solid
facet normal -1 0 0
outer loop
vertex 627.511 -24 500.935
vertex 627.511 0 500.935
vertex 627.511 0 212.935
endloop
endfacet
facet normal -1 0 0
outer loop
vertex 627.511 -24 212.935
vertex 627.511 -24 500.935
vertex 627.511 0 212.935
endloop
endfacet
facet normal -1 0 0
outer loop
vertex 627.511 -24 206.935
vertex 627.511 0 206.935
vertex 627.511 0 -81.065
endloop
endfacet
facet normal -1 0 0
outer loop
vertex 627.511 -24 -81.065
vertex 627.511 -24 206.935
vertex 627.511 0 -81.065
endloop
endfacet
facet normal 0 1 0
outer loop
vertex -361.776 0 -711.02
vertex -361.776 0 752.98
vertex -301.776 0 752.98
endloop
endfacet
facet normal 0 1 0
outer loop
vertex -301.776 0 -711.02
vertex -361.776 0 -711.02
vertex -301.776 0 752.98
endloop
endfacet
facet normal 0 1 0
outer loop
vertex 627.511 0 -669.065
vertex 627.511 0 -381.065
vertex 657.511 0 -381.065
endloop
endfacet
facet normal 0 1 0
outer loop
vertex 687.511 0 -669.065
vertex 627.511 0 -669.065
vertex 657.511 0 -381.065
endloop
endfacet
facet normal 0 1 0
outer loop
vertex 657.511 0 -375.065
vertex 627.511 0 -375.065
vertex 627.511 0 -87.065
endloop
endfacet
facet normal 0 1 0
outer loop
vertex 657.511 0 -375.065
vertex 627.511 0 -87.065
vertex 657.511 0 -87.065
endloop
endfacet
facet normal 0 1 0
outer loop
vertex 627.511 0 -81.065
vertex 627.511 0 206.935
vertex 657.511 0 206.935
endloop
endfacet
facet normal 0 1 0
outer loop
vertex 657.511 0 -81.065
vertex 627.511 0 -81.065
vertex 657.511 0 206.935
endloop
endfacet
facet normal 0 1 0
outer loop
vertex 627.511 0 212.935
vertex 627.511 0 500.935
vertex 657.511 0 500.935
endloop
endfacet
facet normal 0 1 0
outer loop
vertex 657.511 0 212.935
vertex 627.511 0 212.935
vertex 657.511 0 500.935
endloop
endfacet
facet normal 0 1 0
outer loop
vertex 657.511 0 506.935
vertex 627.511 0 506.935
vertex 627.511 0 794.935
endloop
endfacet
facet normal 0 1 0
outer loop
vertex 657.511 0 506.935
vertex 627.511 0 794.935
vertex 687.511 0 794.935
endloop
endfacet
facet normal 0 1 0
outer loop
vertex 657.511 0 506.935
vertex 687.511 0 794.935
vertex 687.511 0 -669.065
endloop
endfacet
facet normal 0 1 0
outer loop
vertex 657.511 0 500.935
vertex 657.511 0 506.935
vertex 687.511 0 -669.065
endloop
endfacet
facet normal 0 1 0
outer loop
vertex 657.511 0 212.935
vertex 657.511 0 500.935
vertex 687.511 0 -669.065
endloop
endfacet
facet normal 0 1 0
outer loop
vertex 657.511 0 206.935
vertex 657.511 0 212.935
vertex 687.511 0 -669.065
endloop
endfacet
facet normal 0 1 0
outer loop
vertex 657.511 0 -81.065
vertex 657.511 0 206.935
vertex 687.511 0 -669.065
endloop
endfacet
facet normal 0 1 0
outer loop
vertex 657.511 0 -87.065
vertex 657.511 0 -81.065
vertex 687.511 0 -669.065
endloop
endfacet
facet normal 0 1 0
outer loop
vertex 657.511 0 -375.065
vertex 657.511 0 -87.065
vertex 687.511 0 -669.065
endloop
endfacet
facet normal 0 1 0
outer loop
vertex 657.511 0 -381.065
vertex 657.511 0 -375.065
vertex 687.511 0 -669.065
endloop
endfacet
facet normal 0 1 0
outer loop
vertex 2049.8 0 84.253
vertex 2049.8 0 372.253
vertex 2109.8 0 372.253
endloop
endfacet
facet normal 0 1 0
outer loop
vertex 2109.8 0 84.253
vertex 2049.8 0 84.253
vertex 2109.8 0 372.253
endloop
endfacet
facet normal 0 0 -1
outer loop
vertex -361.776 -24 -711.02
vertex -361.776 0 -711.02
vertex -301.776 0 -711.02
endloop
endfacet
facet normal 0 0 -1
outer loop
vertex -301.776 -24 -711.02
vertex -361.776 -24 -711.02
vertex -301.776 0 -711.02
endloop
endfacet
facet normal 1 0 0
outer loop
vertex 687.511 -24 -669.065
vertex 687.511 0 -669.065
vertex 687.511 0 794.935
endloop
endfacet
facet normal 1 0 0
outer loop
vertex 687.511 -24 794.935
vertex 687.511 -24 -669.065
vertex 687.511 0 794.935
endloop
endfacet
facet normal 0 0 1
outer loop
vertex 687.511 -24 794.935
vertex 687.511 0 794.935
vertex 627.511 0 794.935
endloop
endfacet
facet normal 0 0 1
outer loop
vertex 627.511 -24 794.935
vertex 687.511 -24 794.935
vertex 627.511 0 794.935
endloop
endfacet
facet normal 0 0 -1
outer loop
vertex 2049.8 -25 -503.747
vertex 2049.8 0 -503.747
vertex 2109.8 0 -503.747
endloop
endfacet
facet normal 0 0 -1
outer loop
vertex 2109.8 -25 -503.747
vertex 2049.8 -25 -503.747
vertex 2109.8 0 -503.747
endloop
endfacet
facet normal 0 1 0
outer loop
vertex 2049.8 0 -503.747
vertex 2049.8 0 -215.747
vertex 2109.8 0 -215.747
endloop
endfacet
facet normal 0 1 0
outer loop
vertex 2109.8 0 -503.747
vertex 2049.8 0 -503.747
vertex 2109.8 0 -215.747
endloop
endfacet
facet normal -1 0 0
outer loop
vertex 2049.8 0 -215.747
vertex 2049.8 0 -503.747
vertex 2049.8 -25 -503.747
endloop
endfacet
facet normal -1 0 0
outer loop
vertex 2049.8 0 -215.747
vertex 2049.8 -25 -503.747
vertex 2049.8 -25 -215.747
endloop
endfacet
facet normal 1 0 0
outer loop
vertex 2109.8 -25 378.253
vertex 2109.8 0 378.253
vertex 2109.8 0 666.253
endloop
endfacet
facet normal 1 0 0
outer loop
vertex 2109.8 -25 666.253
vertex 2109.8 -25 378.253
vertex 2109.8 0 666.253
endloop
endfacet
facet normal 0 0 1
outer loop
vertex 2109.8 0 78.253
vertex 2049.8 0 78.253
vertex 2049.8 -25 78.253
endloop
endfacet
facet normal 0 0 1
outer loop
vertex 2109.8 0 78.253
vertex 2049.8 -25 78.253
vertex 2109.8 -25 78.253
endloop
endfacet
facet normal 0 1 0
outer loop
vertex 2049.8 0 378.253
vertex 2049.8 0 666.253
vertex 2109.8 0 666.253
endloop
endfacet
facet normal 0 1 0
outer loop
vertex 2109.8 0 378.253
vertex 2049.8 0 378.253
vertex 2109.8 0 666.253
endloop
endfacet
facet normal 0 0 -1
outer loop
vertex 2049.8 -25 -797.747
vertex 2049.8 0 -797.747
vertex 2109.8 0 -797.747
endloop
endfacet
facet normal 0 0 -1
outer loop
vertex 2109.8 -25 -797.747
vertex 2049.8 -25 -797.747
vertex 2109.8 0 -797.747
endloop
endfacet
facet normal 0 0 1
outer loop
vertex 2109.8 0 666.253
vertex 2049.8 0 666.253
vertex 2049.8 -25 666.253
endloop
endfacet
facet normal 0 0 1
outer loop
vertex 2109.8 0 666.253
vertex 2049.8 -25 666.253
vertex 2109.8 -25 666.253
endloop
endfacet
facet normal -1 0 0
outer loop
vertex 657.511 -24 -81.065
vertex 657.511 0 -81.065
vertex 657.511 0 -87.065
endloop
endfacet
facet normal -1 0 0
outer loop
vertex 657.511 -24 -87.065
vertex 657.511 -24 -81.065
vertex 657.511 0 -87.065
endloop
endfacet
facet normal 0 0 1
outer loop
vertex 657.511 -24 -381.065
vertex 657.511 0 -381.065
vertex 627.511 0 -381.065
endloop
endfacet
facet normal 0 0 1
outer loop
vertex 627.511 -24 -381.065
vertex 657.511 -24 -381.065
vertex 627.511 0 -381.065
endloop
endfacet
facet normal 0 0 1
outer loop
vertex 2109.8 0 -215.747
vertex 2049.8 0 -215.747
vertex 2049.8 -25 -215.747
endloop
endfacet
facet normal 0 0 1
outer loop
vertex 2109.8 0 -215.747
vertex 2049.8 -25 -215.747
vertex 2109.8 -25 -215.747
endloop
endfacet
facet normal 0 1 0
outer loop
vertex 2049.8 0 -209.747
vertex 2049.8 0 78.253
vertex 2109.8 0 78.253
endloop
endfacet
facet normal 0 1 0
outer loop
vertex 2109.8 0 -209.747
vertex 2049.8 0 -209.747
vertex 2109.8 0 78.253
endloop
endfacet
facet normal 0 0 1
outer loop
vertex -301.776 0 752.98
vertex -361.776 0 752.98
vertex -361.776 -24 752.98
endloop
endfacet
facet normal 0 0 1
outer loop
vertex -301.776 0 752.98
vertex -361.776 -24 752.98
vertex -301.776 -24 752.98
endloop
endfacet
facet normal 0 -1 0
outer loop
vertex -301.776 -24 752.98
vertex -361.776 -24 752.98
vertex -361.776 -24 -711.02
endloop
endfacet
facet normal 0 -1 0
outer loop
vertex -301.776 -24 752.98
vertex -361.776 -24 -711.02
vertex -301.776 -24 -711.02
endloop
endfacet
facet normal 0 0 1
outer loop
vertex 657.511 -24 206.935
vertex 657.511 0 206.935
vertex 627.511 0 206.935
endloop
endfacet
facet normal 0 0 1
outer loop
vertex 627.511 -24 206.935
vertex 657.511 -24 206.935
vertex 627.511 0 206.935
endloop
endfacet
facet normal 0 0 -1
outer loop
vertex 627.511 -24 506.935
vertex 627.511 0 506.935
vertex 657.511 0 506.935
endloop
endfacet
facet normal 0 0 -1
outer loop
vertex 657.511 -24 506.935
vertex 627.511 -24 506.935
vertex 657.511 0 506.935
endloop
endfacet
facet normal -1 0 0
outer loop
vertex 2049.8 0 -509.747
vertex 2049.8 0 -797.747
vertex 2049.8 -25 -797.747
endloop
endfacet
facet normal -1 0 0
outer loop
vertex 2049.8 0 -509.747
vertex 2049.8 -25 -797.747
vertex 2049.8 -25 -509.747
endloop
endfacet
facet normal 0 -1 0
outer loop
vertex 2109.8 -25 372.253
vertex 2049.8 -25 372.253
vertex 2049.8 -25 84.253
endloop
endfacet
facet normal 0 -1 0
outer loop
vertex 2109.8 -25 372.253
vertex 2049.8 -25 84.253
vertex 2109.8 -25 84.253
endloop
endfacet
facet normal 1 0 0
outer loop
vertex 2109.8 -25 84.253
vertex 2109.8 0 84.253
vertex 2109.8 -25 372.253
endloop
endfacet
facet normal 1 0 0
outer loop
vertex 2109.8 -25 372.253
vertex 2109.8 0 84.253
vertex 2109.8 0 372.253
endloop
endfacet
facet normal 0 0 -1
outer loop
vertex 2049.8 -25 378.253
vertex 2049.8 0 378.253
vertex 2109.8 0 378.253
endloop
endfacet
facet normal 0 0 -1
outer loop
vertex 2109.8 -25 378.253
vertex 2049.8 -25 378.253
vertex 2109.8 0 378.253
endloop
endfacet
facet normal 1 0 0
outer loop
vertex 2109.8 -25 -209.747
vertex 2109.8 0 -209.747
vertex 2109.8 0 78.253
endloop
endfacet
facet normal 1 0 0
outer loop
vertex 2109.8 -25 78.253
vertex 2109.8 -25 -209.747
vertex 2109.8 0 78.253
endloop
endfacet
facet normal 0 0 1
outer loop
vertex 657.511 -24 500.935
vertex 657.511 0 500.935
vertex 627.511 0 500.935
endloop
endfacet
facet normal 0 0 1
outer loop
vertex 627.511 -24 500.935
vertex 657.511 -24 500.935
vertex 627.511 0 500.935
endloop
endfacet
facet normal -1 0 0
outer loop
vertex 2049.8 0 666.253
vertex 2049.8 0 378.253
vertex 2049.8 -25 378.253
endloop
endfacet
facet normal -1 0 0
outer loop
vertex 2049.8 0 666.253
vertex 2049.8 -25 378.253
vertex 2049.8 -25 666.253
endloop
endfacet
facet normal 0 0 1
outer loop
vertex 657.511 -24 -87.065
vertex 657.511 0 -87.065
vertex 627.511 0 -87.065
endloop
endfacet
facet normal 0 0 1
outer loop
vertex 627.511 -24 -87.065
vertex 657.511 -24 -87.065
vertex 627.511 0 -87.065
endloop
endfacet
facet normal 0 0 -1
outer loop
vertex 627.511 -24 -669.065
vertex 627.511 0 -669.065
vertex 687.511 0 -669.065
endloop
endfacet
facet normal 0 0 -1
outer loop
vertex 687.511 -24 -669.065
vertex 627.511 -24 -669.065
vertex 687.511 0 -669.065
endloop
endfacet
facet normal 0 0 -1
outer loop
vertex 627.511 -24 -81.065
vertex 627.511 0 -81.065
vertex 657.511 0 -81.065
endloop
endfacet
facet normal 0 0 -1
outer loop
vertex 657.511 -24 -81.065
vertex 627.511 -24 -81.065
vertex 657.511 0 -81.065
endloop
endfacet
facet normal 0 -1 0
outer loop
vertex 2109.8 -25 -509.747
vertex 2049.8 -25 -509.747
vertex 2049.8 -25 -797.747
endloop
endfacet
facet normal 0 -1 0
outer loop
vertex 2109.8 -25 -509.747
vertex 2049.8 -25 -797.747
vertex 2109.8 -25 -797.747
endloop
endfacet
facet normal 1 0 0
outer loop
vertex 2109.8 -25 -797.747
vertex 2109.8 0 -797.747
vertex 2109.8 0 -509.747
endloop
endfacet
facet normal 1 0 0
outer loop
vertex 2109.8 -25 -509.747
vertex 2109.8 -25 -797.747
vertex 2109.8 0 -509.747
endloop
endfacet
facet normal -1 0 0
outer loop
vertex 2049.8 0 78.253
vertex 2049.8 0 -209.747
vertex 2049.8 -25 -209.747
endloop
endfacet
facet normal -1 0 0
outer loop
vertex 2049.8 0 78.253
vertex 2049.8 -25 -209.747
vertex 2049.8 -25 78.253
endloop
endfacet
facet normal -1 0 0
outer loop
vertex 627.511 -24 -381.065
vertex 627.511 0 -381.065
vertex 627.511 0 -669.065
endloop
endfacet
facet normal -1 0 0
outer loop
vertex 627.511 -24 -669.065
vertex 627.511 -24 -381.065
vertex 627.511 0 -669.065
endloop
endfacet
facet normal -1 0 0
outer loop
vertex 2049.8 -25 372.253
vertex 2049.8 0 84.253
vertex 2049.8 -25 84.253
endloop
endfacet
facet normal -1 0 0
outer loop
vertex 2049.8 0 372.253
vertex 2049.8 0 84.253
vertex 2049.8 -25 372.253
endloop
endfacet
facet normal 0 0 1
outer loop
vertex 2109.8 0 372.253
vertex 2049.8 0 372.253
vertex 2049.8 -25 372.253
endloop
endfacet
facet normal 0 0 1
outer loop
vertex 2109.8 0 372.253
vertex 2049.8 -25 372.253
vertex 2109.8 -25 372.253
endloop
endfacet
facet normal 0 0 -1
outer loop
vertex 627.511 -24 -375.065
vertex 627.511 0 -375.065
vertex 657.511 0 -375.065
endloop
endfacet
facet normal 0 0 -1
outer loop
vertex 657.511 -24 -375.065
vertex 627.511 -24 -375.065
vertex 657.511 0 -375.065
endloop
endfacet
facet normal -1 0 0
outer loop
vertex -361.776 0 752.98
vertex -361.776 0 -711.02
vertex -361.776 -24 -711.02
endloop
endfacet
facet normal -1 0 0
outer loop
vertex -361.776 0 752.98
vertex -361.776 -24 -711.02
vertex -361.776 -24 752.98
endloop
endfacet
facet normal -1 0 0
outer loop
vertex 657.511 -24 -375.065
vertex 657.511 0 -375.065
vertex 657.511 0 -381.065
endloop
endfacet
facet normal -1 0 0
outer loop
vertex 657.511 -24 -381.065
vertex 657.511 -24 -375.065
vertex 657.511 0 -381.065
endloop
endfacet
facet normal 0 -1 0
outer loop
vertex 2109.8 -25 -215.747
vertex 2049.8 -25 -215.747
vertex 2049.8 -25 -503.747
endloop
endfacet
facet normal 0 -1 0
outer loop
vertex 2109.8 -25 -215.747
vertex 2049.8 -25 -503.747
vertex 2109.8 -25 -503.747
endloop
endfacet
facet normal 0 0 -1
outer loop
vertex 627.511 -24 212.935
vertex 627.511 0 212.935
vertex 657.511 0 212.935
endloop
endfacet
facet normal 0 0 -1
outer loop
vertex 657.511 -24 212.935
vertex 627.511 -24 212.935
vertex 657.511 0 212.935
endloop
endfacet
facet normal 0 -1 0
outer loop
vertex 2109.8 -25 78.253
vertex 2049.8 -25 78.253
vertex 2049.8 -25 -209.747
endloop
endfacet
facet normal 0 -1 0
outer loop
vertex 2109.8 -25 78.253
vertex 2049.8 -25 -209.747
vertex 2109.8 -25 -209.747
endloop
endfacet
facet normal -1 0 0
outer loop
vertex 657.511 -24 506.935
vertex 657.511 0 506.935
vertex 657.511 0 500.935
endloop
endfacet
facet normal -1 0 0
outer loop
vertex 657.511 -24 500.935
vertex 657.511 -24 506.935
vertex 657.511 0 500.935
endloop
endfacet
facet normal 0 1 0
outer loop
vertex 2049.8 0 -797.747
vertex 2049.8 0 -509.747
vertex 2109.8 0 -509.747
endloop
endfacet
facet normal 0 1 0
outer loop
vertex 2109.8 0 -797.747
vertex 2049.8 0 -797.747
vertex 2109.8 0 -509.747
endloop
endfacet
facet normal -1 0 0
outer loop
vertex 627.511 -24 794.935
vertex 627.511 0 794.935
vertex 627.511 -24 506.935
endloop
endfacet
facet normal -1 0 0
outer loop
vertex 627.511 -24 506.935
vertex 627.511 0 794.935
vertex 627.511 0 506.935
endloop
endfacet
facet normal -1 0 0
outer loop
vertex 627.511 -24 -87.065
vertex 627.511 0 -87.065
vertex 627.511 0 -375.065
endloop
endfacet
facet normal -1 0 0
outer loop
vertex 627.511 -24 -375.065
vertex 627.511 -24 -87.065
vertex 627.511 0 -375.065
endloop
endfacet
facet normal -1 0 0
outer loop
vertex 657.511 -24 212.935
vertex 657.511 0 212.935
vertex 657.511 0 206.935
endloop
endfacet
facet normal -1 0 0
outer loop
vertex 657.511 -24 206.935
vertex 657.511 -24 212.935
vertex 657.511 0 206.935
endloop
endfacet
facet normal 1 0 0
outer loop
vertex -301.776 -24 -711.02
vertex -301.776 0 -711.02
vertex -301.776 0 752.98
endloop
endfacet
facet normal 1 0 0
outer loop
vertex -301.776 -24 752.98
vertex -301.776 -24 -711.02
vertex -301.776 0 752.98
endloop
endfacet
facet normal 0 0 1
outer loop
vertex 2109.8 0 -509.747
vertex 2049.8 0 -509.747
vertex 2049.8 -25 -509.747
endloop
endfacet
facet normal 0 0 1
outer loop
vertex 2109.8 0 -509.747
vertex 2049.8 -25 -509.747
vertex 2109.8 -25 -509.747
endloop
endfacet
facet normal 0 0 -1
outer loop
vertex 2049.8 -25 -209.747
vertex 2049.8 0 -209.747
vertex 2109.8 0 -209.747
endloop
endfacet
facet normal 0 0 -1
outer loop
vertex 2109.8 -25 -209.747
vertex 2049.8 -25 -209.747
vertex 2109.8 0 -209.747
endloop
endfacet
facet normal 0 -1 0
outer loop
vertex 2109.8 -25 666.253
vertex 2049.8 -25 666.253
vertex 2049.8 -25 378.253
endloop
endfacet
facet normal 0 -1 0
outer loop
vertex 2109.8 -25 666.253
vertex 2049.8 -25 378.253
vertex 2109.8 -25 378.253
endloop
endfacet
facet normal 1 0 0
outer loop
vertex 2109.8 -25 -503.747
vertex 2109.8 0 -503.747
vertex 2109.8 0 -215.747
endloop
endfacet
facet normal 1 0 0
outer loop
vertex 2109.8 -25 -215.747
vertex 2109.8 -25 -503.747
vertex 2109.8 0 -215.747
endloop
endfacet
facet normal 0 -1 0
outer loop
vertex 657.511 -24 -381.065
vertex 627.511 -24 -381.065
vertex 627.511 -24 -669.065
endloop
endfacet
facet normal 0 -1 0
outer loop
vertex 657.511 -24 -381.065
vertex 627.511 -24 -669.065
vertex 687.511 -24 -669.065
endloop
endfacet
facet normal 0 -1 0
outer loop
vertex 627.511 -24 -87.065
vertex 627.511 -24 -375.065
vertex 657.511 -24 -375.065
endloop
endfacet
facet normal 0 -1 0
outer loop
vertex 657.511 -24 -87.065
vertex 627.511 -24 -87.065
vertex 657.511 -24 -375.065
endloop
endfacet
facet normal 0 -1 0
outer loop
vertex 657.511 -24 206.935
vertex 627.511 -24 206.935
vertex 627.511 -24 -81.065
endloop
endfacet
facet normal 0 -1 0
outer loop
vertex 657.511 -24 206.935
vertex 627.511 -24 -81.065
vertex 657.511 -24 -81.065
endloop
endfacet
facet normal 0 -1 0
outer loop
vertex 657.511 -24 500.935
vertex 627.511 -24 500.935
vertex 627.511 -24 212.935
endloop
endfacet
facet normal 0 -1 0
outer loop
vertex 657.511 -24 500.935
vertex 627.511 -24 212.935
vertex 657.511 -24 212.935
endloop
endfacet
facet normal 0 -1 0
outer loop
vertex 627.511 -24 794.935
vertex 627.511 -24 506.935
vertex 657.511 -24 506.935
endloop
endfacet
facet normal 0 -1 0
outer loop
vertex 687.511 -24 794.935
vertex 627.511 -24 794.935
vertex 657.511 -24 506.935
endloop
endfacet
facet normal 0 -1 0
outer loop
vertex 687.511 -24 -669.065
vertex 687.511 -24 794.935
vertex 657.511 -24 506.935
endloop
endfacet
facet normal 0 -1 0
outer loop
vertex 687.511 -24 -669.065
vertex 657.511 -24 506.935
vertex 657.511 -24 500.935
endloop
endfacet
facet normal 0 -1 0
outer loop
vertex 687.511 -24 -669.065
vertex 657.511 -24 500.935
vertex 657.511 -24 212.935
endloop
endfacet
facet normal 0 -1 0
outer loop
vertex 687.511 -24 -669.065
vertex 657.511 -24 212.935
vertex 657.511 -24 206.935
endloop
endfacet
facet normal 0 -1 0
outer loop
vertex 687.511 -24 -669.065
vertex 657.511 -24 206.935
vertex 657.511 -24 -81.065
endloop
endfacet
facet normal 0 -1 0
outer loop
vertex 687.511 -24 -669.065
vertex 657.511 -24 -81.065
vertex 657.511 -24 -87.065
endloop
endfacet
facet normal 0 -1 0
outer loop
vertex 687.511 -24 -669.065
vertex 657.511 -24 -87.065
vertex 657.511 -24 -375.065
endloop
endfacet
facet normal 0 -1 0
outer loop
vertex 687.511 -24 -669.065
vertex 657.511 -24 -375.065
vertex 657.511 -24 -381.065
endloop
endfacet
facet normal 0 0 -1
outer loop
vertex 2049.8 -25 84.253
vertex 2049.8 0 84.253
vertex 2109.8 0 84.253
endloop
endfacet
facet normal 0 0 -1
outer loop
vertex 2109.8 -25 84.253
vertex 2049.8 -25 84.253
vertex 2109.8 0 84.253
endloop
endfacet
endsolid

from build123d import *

# Parameters (mm, degrees)
F0_W     = 60
F0_H     = 1464
F1_DEPTH = 24
F2_W     = 60
F2_H     = 288
F3_DEPTH = 25
F5_DEPTH = 24


with BuildPart() as f1:
    # F0 (on Front) → F1 (new body)
    with BuildSketch(Plane.XZ):
        with Locations((-331.775755, 20.97973)):
            Rectangle(F0_W, F0_H)
    extrude(amount=F1_DEPTH)


with BuildPart() as f3:
    # F2 (on Front) → F3 (new body)
    with BuildSketch(Plane.XZ):
        with Locations((2079.800396, 522.253342)):
            Rectangle(F2_W, F2_H)
        with Locations((2079.800396, 228.253342)):
            Rectangle(F2_W, F2_H)
        with Locations((2079.800396, -65.746658)):
            Rectangle(F2_W, F2_H)
        with Locations((2079.800396, -359.746658)):
            Rectangle(F2_W, F2_H)
        with Locations((2079.800396, -653.746658)):
            Rectangle(F2_W, F2_H)
    extrude(amount=F3_DEPTH)


with BuildPart() as f5:
    # F4 (on Front) → F5 (new body)
    with BuildSketch(Plane.XZ):
        Polygon((627.510638, 794.934957), (627.510638, 506.934957), (657.510638, 506.934957), (657.510638, 500.934957), (627.510638, 500.934957), (627.510638, 212.934957), (657.510638, 212.934957), (657.510638, 206.934957), (627.510638, 206.934957), (627.510638, -81.065043), (657.510638, -81.065043), (657.510638, -87.065043), (627.510638, -87.065043), (627.510638, -375.065043), (657.510638, -375.065043), (657.510638, -381.065043), (627.510638, -381.065043), (627.510638, -669.065043), (687.510638, -669.065043), (687.510638, 794.934957), align=None)
    extrude(amount=F5_DEPTH)


solid = Compound([f1.part, f3.part, f5.part])
